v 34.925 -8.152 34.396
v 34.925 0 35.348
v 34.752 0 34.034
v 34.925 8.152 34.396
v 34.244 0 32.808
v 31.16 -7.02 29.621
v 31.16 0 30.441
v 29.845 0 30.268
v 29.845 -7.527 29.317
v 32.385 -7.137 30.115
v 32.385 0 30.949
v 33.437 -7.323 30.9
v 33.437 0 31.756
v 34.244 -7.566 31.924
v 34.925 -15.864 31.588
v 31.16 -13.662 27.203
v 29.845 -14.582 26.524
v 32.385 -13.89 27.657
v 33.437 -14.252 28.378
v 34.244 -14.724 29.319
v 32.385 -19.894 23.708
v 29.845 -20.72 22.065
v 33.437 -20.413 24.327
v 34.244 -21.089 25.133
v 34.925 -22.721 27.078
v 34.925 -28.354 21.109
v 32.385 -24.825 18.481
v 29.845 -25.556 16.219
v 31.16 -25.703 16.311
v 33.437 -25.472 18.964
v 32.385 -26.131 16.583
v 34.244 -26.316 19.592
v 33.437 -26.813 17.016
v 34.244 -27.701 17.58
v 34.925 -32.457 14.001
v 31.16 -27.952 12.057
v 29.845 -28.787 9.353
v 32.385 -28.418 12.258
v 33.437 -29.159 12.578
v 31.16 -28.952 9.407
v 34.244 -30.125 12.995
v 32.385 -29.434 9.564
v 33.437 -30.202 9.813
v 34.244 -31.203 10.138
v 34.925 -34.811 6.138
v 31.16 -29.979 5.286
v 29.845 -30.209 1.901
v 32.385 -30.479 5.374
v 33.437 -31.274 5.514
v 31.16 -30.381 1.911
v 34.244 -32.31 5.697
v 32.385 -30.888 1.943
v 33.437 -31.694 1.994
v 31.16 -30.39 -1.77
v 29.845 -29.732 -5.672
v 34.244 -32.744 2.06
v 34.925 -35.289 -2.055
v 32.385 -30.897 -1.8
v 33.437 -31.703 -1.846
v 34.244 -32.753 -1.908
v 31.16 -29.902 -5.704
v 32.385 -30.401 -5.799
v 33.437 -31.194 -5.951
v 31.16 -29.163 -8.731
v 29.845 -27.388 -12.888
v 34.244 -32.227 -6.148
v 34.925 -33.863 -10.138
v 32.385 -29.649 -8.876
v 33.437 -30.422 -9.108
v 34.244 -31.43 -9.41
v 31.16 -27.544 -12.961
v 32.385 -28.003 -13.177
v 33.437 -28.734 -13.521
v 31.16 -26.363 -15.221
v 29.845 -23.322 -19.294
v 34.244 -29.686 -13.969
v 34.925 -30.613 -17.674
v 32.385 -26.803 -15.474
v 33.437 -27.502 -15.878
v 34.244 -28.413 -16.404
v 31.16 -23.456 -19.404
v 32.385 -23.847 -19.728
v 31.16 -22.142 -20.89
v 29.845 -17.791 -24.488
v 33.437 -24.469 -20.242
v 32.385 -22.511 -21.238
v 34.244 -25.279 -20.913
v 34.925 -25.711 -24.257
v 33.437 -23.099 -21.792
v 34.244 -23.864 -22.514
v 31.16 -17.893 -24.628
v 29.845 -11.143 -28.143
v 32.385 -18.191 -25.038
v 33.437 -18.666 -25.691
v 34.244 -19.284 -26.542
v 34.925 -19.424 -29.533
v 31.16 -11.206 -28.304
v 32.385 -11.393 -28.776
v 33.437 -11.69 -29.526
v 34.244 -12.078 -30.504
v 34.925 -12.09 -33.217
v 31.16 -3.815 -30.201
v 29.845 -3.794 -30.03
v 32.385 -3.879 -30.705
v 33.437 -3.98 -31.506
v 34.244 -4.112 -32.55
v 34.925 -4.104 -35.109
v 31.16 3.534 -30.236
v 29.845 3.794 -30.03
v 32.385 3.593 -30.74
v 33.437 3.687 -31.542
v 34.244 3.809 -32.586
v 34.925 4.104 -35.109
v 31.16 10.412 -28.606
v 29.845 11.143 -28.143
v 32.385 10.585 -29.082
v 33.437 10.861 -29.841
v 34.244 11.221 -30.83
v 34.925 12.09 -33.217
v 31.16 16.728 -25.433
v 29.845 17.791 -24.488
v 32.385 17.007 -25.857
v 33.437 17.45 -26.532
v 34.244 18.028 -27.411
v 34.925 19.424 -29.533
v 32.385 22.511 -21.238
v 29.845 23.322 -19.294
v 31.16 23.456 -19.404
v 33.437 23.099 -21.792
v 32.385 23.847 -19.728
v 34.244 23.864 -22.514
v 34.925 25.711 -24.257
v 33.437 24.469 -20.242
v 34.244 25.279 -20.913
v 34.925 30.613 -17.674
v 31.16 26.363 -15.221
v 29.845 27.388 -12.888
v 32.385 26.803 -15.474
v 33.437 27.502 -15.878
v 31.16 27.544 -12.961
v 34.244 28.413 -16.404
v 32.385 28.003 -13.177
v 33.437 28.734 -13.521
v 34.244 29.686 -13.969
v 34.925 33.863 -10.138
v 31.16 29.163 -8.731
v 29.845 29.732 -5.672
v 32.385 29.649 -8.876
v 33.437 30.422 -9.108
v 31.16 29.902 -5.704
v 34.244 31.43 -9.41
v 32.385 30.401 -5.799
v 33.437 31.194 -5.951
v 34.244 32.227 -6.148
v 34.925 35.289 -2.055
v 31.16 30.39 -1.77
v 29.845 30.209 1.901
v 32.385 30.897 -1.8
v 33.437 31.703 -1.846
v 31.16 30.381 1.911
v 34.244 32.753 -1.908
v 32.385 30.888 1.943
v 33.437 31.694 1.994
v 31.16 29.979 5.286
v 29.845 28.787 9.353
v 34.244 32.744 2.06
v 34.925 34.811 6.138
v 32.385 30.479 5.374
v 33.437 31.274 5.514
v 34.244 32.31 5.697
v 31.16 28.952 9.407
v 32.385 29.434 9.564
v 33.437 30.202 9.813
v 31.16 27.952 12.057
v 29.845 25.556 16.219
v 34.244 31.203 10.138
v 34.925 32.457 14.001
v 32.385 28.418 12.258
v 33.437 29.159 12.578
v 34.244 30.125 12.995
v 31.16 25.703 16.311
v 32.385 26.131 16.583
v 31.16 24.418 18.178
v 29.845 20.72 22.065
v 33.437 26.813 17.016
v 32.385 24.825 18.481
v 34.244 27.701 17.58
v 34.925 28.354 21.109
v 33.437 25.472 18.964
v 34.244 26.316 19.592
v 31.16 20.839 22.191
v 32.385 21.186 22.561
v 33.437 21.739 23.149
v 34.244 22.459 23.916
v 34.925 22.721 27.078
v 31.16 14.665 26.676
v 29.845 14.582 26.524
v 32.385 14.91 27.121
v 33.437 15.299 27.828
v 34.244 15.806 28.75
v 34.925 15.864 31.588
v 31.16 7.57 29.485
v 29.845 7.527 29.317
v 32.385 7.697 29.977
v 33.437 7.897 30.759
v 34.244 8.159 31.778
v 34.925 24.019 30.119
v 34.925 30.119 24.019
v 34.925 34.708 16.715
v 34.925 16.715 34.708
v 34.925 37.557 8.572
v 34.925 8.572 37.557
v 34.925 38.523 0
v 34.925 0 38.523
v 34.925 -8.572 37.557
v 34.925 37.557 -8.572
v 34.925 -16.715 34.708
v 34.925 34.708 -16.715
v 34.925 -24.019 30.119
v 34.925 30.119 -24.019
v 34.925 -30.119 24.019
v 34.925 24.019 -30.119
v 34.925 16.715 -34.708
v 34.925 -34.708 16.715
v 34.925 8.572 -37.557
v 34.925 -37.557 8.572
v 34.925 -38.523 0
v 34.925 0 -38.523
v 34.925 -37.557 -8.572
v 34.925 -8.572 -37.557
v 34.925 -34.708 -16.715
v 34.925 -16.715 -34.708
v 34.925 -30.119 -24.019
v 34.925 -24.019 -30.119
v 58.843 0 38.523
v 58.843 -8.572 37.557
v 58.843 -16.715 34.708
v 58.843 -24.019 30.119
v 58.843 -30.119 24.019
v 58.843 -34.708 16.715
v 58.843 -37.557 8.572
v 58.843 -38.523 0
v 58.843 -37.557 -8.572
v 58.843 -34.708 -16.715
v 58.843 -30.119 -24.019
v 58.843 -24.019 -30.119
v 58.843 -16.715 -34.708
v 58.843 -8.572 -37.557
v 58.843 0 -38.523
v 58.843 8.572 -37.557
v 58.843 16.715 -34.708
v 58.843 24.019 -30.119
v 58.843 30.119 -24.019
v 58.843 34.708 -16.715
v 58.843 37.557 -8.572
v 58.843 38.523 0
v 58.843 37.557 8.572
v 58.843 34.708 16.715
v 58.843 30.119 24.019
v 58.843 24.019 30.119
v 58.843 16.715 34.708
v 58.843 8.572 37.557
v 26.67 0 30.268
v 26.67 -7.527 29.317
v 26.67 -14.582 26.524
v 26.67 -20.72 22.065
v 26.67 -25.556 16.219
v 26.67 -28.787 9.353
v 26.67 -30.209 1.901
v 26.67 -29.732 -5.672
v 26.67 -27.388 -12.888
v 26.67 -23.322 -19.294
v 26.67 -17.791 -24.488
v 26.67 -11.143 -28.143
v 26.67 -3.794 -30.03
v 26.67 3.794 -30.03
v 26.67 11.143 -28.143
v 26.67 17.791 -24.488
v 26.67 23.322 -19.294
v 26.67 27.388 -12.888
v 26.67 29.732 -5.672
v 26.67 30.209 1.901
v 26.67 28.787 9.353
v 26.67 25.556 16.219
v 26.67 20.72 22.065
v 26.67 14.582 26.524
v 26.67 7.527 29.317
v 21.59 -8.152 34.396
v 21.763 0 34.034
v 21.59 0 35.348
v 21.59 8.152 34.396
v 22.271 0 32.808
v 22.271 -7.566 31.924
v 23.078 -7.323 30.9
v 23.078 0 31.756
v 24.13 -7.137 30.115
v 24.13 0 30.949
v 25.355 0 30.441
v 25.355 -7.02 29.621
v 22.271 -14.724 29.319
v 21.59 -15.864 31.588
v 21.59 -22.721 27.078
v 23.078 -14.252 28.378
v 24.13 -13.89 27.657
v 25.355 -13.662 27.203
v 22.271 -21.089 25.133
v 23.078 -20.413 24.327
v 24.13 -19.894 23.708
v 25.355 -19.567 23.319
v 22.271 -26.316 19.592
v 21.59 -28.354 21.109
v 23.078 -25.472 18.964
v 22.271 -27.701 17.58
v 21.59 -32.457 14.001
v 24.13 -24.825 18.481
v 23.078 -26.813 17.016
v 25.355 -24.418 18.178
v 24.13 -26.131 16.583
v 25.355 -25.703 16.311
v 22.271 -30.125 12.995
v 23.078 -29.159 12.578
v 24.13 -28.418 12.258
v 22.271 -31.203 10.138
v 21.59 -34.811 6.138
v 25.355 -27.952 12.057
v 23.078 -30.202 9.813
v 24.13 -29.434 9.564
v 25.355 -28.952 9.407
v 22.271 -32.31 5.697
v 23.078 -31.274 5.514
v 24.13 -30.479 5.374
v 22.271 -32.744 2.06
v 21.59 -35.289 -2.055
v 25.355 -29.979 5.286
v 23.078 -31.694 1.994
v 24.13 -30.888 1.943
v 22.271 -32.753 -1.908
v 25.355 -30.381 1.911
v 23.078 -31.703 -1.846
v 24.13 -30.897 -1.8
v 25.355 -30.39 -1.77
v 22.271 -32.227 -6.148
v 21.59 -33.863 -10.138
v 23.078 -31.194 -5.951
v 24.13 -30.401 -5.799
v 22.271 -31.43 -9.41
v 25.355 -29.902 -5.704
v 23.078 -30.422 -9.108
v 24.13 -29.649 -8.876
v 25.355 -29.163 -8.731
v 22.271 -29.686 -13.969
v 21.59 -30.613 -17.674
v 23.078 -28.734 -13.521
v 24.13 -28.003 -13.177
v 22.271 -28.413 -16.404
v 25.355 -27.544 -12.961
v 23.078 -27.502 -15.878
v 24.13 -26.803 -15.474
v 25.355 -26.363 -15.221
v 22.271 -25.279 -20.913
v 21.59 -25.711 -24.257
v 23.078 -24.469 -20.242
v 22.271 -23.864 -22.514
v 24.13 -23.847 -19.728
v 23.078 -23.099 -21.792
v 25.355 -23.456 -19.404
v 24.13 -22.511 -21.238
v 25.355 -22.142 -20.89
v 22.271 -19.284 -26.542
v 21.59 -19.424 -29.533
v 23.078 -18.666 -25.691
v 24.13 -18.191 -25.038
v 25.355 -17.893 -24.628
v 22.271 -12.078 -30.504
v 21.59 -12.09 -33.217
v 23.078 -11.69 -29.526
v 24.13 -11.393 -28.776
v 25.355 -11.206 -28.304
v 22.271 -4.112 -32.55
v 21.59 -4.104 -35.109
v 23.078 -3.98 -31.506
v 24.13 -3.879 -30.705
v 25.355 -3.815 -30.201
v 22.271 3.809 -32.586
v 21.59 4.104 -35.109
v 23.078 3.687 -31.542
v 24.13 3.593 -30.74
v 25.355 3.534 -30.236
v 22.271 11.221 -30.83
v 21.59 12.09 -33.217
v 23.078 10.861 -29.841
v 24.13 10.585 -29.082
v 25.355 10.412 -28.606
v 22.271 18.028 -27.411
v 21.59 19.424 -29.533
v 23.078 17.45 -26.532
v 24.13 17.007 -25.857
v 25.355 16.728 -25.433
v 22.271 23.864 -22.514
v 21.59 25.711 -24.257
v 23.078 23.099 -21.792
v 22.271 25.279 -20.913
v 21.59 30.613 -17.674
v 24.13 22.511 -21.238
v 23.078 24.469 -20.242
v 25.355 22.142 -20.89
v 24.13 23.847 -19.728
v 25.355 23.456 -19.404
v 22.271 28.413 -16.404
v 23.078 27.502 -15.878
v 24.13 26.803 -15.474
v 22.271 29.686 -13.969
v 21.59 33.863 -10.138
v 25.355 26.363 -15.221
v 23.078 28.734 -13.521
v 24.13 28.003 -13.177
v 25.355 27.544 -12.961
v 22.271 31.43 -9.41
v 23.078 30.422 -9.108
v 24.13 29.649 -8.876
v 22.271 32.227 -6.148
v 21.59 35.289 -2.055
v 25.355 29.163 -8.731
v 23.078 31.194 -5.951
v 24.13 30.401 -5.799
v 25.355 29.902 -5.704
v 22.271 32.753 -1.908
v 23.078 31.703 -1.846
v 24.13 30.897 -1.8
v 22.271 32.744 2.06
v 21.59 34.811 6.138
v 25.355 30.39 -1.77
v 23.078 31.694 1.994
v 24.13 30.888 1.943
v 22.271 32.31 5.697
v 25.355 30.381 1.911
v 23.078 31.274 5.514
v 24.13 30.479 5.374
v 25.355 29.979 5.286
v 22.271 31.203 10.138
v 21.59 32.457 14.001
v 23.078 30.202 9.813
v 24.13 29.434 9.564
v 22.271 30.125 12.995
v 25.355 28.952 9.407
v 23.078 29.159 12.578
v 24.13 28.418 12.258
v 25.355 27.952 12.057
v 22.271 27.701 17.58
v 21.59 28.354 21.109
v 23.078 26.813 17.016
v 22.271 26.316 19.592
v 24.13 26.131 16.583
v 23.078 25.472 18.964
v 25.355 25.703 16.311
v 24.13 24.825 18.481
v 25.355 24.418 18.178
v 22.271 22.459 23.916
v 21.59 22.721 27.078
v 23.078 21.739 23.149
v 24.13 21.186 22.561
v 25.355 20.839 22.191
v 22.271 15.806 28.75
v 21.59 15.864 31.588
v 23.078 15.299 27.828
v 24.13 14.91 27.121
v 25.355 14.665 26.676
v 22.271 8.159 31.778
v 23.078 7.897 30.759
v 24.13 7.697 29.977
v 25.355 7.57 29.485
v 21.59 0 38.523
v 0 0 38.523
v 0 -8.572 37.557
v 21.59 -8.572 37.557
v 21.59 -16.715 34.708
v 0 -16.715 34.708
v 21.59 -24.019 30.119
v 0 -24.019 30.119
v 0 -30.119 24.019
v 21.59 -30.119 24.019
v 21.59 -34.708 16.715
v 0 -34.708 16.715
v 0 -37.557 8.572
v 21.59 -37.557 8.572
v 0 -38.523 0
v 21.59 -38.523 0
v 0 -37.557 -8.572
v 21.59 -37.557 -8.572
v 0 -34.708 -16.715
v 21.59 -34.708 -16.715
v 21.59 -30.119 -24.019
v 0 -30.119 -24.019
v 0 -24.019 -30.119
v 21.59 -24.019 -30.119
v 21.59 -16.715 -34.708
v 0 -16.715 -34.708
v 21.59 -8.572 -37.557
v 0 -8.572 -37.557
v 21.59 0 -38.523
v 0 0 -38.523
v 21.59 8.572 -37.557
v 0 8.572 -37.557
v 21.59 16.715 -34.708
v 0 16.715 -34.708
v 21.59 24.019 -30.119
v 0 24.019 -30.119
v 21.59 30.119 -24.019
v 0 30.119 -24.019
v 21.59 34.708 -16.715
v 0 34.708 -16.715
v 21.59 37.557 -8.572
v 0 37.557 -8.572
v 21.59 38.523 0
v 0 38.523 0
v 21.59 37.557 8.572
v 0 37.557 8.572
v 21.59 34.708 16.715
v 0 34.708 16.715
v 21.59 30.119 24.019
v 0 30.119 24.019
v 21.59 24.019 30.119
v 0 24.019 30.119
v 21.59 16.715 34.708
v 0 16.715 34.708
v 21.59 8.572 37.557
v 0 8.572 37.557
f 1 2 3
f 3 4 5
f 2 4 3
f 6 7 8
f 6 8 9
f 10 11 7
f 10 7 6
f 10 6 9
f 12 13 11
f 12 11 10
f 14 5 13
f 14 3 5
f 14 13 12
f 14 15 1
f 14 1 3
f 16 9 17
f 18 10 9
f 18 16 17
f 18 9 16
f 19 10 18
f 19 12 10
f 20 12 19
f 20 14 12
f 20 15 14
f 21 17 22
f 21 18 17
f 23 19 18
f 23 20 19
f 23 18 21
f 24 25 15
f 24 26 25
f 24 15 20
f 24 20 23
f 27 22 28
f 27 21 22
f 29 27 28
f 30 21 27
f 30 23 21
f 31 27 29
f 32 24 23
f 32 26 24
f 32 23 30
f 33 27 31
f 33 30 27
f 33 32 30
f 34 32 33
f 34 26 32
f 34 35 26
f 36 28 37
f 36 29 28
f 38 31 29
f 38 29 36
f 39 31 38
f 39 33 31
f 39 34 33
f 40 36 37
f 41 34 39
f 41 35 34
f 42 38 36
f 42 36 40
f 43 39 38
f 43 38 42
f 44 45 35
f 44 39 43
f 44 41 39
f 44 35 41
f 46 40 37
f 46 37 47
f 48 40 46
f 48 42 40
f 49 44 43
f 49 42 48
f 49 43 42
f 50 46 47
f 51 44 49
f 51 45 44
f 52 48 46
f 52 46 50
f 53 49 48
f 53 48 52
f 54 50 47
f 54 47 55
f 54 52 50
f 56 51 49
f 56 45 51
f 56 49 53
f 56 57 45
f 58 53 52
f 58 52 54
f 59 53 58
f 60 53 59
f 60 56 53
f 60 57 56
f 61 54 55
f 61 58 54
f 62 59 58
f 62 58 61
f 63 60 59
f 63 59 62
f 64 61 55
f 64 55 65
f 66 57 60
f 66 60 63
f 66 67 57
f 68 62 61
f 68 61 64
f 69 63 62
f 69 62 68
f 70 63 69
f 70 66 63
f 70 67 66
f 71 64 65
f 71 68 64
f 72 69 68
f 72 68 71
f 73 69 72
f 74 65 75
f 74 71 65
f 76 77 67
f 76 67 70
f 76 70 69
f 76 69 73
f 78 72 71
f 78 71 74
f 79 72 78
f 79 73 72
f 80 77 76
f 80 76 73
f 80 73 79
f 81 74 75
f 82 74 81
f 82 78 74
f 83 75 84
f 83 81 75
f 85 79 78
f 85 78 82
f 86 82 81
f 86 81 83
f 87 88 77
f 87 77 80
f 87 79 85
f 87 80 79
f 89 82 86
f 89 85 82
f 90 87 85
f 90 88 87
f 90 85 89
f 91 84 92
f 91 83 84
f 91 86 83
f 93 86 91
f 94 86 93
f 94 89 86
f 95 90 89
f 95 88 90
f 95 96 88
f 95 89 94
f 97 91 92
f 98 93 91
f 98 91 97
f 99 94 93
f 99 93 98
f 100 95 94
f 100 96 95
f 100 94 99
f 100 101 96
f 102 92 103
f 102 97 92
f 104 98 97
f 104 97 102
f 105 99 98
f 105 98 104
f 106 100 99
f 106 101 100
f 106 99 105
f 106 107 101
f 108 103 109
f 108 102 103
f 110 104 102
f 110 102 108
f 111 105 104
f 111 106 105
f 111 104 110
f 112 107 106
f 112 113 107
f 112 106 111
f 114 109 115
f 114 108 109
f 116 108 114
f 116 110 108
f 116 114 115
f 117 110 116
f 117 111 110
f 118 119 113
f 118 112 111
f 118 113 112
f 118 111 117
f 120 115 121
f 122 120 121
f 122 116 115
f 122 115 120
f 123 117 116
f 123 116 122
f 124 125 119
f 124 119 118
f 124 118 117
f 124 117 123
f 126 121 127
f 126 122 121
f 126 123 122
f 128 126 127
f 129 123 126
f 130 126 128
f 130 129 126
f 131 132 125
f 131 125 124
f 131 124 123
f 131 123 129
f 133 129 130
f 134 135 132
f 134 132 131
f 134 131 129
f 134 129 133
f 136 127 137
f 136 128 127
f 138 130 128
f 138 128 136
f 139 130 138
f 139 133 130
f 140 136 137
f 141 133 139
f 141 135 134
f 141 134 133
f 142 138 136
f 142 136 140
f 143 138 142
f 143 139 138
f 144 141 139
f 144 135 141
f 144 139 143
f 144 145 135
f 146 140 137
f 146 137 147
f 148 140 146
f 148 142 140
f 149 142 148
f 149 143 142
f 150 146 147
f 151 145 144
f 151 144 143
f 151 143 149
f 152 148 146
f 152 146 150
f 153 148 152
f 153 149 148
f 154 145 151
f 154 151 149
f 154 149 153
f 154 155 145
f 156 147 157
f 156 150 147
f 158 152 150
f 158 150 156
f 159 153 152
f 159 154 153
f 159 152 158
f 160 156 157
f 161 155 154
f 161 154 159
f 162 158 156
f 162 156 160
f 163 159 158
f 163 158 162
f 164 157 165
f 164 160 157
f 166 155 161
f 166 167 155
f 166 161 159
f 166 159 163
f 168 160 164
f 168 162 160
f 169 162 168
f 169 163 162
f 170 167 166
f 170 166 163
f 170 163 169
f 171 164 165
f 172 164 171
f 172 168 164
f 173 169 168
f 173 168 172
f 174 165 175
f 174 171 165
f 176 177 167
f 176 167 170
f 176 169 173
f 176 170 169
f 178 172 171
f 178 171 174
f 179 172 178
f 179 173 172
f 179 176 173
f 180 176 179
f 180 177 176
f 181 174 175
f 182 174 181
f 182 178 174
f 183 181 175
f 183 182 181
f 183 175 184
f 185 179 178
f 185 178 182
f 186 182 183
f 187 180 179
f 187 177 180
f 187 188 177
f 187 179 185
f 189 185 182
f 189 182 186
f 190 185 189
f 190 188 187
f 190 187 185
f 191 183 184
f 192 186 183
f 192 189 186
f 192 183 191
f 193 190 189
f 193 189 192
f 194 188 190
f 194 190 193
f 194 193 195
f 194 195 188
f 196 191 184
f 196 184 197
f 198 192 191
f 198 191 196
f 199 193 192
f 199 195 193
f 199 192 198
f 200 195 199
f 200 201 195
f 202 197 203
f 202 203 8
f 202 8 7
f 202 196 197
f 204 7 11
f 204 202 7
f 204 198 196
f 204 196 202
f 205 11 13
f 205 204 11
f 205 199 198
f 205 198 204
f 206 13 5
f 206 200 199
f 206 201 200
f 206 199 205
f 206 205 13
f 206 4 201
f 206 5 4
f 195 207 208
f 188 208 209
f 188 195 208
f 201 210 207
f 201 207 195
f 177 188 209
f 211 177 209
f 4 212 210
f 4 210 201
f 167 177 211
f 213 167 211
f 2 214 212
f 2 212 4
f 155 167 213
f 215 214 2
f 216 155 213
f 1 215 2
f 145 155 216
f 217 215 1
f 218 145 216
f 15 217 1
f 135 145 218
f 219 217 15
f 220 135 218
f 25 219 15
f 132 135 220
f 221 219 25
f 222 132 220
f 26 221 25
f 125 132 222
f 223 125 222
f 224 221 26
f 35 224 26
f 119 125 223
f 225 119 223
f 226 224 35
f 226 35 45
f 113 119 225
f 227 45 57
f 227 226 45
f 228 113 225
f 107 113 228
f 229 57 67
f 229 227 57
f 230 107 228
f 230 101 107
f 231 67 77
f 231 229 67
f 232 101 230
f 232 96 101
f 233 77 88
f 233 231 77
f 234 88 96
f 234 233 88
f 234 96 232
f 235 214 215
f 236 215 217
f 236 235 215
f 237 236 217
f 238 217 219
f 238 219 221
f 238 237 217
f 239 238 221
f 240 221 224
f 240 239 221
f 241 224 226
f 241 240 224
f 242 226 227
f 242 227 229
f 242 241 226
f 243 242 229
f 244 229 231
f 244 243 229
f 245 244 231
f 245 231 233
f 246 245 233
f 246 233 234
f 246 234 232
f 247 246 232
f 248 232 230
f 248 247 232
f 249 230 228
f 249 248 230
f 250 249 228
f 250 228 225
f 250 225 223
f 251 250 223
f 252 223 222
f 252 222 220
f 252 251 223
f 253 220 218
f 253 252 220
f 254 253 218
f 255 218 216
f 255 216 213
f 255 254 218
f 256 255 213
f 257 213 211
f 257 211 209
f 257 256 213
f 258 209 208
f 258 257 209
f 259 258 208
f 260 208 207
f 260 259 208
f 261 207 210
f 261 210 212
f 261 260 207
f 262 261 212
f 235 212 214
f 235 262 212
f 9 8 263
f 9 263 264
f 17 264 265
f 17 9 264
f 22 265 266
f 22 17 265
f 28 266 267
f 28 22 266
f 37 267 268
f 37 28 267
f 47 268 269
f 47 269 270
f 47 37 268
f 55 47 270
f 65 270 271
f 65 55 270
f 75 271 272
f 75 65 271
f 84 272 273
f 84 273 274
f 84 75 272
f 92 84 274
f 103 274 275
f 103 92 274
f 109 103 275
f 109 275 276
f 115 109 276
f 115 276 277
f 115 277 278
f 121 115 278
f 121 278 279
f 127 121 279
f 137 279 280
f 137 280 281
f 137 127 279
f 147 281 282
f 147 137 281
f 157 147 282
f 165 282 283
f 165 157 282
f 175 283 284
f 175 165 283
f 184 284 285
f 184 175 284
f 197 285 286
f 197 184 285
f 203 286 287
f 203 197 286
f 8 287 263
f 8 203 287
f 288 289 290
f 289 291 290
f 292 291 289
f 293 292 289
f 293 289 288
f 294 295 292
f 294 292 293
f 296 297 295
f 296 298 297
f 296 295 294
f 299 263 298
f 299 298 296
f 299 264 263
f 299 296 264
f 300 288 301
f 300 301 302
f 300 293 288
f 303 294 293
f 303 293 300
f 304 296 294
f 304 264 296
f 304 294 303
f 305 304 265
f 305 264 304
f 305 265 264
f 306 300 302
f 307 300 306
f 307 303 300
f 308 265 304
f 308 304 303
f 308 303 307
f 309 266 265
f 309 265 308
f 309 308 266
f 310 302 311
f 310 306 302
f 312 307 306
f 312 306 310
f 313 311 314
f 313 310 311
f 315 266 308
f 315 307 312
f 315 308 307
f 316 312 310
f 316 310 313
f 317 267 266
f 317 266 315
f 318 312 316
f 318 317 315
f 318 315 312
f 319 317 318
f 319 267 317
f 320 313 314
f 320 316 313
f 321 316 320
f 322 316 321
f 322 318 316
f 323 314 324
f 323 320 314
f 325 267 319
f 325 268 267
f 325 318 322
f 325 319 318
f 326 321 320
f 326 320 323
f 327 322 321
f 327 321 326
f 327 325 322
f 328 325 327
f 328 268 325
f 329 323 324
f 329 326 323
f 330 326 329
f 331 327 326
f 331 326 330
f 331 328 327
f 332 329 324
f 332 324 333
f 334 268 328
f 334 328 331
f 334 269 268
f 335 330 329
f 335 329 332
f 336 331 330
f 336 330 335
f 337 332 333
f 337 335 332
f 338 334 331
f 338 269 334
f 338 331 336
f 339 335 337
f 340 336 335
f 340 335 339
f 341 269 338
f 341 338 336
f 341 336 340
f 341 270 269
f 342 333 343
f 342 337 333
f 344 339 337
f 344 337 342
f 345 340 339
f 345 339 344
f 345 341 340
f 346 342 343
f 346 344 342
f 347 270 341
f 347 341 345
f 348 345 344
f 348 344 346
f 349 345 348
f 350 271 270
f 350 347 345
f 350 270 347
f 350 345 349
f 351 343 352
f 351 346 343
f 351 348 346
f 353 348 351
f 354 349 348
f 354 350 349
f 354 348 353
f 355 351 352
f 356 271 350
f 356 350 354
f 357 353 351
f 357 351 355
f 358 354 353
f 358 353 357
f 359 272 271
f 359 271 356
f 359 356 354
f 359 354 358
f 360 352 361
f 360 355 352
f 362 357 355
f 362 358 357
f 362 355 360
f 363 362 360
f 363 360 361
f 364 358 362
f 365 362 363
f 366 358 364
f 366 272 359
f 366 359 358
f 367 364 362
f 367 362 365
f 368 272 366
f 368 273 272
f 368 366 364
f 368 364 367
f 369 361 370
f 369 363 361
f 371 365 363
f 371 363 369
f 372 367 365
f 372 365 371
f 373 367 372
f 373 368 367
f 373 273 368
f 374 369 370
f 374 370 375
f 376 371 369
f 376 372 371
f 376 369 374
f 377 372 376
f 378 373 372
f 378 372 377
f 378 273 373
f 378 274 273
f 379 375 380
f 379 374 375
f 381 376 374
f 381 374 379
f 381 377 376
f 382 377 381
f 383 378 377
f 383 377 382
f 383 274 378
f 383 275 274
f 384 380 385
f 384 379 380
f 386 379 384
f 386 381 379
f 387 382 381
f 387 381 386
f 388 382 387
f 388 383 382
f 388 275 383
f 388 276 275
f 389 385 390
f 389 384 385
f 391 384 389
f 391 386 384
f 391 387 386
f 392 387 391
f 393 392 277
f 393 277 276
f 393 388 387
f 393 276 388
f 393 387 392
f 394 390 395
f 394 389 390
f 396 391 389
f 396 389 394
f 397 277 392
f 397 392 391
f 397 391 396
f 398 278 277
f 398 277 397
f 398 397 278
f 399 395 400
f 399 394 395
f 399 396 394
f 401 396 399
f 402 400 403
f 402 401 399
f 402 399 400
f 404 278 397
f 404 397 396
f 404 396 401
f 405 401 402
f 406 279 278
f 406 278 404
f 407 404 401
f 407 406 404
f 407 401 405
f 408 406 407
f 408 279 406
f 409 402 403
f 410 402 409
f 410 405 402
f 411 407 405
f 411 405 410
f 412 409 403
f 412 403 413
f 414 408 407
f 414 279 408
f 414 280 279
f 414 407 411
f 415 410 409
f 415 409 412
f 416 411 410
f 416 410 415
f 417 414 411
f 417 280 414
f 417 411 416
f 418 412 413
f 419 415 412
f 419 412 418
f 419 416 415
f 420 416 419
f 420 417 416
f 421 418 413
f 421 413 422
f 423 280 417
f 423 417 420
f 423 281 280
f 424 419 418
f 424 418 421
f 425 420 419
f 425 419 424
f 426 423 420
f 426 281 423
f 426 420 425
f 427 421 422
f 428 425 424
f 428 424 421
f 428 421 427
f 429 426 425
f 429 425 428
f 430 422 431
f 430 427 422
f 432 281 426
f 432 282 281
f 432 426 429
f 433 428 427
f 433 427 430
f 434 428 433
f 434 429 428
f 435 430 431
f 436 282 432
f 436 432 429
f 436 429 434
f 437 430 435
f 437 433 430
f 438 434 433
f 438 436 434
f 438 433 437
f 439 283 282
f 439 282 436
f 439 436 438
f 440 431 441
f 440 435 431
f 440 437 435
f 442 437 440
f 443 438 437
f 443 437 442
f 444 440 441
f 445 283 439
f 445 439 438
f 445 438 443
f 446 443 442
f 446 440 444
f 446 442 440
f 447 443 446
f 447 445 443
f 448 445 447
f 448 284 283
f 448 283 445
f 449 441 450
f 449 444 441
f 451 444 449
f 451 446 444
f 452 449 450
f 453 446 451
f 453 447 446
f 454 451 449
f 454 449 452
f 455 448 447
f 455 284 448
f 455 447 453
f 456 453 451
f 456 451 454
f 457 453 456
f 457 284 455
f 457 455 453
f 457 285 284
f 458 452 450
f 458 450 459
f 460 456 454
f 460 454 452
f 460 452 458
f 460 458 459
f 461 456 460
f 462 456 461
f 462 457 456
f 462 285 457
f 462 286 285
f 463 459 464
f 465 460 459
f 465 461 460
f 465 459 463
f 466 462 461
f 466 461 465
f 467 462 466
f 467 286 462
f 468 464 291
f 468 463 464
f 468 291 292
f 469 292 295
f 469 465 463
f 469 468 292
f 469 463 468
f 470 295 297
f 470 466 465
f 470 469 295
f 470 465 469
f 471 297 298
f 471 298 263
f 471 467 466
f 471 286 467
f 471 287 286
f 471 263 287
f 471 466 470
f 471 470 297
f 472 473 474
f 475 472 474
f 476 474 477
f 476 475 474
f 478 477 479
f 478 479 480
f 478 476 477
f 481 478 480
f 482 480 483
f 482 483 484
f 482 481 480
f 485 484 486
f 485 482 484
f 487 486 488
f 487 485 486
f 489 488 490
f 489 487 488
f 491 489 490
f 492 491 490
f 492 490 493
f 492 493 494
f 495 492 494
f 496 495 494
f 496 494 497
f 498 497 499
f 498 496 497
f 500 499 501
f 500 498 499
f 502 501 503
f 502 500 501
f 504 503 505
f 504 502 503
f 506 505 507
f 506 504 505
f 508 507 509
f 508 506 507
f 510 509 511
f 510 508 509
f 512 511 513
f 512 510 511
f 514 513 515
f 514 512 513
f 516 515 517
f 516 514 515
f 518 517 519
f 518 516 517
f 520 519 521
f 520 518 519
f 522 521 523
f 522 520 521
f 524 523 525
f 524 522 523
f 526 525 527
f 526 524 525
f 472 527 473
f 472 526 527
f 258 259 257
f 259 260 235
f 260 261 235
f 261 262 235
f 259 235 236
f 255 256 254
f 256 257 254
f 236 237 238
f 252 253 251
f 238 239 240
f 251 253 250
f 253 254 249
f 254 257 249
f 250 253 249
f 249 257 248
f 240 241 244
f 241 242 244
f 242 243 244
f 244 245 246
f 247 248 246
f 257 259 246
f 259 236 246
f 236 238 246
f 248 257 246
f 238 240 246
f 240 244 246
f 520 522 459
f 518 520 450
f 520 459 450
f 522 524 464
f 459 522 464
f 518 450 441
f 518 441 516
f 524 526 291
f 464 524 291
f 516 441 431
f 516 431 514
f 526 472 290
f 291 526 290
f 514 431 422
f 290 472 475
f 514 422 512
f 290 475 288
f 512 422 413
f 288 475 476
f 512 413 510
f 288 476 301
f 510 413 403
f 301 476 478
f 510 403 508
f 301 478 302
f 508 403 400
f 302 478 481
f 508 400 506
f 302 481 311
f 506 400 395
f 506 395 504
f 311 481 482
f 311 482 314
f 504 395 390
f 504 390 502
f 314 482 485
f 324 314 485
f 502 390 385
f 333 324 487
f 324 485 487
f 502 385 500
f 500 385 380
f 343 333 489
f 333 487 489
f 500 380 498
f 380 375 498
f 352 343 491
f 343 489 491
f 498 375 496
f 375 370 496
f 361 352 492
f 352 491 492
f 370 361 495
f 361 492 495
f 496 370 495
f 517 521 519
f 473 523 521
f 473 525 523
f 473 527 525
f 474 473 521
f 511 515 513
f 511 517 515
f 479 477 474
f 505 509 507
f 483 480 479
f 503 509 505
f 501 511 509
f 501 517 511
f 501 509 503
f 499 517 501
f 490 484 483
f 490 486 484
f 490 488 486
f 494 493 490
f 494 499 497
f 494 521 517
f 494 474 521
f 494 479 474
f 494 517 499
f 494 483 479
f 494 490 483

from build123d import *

# Parameters (mm, degrees)
F0_W = 58.8433295488
F0_H = 38.5233350098
F2_W = 13.3350025862
F2_H = 11.2183336169
F4_R = 5.08


with BuildPart() as f1:
    # F0 (on Front) → F1 (revolve)
    with BuildSketch(Plane.XZ):
        with Locations((29.4216647744, 19.2616675049)):
            Rectangle(F0_W, F0_H)
    revolve(axis=Axis((29.4216647744, 0, 0), (1, 0, 0)))

    # F2 (on Front) → F3 (revolve, cut)
    with BuildSketch(Plane.XZ):
        with Locations((28.2575013116, 35.8774987981)):
            Rectangle(F2_W, F2_H)
    revolve(axis=Axis((32.2791673243, 0, 0), (1, 0, 0)), mode=Mode.SUBTRACT)

    # F4
    f4_edges = [f1.edges().sort_by_distance(p)[0] for p in [
        (21.59, 0, -30.268332),
        (34.925003, 0, -30.268332),
        (28.257501, 0, 30.268332),
    ]]
    fillet(f4_edges, radius=F4_R)


solid = f1.part
